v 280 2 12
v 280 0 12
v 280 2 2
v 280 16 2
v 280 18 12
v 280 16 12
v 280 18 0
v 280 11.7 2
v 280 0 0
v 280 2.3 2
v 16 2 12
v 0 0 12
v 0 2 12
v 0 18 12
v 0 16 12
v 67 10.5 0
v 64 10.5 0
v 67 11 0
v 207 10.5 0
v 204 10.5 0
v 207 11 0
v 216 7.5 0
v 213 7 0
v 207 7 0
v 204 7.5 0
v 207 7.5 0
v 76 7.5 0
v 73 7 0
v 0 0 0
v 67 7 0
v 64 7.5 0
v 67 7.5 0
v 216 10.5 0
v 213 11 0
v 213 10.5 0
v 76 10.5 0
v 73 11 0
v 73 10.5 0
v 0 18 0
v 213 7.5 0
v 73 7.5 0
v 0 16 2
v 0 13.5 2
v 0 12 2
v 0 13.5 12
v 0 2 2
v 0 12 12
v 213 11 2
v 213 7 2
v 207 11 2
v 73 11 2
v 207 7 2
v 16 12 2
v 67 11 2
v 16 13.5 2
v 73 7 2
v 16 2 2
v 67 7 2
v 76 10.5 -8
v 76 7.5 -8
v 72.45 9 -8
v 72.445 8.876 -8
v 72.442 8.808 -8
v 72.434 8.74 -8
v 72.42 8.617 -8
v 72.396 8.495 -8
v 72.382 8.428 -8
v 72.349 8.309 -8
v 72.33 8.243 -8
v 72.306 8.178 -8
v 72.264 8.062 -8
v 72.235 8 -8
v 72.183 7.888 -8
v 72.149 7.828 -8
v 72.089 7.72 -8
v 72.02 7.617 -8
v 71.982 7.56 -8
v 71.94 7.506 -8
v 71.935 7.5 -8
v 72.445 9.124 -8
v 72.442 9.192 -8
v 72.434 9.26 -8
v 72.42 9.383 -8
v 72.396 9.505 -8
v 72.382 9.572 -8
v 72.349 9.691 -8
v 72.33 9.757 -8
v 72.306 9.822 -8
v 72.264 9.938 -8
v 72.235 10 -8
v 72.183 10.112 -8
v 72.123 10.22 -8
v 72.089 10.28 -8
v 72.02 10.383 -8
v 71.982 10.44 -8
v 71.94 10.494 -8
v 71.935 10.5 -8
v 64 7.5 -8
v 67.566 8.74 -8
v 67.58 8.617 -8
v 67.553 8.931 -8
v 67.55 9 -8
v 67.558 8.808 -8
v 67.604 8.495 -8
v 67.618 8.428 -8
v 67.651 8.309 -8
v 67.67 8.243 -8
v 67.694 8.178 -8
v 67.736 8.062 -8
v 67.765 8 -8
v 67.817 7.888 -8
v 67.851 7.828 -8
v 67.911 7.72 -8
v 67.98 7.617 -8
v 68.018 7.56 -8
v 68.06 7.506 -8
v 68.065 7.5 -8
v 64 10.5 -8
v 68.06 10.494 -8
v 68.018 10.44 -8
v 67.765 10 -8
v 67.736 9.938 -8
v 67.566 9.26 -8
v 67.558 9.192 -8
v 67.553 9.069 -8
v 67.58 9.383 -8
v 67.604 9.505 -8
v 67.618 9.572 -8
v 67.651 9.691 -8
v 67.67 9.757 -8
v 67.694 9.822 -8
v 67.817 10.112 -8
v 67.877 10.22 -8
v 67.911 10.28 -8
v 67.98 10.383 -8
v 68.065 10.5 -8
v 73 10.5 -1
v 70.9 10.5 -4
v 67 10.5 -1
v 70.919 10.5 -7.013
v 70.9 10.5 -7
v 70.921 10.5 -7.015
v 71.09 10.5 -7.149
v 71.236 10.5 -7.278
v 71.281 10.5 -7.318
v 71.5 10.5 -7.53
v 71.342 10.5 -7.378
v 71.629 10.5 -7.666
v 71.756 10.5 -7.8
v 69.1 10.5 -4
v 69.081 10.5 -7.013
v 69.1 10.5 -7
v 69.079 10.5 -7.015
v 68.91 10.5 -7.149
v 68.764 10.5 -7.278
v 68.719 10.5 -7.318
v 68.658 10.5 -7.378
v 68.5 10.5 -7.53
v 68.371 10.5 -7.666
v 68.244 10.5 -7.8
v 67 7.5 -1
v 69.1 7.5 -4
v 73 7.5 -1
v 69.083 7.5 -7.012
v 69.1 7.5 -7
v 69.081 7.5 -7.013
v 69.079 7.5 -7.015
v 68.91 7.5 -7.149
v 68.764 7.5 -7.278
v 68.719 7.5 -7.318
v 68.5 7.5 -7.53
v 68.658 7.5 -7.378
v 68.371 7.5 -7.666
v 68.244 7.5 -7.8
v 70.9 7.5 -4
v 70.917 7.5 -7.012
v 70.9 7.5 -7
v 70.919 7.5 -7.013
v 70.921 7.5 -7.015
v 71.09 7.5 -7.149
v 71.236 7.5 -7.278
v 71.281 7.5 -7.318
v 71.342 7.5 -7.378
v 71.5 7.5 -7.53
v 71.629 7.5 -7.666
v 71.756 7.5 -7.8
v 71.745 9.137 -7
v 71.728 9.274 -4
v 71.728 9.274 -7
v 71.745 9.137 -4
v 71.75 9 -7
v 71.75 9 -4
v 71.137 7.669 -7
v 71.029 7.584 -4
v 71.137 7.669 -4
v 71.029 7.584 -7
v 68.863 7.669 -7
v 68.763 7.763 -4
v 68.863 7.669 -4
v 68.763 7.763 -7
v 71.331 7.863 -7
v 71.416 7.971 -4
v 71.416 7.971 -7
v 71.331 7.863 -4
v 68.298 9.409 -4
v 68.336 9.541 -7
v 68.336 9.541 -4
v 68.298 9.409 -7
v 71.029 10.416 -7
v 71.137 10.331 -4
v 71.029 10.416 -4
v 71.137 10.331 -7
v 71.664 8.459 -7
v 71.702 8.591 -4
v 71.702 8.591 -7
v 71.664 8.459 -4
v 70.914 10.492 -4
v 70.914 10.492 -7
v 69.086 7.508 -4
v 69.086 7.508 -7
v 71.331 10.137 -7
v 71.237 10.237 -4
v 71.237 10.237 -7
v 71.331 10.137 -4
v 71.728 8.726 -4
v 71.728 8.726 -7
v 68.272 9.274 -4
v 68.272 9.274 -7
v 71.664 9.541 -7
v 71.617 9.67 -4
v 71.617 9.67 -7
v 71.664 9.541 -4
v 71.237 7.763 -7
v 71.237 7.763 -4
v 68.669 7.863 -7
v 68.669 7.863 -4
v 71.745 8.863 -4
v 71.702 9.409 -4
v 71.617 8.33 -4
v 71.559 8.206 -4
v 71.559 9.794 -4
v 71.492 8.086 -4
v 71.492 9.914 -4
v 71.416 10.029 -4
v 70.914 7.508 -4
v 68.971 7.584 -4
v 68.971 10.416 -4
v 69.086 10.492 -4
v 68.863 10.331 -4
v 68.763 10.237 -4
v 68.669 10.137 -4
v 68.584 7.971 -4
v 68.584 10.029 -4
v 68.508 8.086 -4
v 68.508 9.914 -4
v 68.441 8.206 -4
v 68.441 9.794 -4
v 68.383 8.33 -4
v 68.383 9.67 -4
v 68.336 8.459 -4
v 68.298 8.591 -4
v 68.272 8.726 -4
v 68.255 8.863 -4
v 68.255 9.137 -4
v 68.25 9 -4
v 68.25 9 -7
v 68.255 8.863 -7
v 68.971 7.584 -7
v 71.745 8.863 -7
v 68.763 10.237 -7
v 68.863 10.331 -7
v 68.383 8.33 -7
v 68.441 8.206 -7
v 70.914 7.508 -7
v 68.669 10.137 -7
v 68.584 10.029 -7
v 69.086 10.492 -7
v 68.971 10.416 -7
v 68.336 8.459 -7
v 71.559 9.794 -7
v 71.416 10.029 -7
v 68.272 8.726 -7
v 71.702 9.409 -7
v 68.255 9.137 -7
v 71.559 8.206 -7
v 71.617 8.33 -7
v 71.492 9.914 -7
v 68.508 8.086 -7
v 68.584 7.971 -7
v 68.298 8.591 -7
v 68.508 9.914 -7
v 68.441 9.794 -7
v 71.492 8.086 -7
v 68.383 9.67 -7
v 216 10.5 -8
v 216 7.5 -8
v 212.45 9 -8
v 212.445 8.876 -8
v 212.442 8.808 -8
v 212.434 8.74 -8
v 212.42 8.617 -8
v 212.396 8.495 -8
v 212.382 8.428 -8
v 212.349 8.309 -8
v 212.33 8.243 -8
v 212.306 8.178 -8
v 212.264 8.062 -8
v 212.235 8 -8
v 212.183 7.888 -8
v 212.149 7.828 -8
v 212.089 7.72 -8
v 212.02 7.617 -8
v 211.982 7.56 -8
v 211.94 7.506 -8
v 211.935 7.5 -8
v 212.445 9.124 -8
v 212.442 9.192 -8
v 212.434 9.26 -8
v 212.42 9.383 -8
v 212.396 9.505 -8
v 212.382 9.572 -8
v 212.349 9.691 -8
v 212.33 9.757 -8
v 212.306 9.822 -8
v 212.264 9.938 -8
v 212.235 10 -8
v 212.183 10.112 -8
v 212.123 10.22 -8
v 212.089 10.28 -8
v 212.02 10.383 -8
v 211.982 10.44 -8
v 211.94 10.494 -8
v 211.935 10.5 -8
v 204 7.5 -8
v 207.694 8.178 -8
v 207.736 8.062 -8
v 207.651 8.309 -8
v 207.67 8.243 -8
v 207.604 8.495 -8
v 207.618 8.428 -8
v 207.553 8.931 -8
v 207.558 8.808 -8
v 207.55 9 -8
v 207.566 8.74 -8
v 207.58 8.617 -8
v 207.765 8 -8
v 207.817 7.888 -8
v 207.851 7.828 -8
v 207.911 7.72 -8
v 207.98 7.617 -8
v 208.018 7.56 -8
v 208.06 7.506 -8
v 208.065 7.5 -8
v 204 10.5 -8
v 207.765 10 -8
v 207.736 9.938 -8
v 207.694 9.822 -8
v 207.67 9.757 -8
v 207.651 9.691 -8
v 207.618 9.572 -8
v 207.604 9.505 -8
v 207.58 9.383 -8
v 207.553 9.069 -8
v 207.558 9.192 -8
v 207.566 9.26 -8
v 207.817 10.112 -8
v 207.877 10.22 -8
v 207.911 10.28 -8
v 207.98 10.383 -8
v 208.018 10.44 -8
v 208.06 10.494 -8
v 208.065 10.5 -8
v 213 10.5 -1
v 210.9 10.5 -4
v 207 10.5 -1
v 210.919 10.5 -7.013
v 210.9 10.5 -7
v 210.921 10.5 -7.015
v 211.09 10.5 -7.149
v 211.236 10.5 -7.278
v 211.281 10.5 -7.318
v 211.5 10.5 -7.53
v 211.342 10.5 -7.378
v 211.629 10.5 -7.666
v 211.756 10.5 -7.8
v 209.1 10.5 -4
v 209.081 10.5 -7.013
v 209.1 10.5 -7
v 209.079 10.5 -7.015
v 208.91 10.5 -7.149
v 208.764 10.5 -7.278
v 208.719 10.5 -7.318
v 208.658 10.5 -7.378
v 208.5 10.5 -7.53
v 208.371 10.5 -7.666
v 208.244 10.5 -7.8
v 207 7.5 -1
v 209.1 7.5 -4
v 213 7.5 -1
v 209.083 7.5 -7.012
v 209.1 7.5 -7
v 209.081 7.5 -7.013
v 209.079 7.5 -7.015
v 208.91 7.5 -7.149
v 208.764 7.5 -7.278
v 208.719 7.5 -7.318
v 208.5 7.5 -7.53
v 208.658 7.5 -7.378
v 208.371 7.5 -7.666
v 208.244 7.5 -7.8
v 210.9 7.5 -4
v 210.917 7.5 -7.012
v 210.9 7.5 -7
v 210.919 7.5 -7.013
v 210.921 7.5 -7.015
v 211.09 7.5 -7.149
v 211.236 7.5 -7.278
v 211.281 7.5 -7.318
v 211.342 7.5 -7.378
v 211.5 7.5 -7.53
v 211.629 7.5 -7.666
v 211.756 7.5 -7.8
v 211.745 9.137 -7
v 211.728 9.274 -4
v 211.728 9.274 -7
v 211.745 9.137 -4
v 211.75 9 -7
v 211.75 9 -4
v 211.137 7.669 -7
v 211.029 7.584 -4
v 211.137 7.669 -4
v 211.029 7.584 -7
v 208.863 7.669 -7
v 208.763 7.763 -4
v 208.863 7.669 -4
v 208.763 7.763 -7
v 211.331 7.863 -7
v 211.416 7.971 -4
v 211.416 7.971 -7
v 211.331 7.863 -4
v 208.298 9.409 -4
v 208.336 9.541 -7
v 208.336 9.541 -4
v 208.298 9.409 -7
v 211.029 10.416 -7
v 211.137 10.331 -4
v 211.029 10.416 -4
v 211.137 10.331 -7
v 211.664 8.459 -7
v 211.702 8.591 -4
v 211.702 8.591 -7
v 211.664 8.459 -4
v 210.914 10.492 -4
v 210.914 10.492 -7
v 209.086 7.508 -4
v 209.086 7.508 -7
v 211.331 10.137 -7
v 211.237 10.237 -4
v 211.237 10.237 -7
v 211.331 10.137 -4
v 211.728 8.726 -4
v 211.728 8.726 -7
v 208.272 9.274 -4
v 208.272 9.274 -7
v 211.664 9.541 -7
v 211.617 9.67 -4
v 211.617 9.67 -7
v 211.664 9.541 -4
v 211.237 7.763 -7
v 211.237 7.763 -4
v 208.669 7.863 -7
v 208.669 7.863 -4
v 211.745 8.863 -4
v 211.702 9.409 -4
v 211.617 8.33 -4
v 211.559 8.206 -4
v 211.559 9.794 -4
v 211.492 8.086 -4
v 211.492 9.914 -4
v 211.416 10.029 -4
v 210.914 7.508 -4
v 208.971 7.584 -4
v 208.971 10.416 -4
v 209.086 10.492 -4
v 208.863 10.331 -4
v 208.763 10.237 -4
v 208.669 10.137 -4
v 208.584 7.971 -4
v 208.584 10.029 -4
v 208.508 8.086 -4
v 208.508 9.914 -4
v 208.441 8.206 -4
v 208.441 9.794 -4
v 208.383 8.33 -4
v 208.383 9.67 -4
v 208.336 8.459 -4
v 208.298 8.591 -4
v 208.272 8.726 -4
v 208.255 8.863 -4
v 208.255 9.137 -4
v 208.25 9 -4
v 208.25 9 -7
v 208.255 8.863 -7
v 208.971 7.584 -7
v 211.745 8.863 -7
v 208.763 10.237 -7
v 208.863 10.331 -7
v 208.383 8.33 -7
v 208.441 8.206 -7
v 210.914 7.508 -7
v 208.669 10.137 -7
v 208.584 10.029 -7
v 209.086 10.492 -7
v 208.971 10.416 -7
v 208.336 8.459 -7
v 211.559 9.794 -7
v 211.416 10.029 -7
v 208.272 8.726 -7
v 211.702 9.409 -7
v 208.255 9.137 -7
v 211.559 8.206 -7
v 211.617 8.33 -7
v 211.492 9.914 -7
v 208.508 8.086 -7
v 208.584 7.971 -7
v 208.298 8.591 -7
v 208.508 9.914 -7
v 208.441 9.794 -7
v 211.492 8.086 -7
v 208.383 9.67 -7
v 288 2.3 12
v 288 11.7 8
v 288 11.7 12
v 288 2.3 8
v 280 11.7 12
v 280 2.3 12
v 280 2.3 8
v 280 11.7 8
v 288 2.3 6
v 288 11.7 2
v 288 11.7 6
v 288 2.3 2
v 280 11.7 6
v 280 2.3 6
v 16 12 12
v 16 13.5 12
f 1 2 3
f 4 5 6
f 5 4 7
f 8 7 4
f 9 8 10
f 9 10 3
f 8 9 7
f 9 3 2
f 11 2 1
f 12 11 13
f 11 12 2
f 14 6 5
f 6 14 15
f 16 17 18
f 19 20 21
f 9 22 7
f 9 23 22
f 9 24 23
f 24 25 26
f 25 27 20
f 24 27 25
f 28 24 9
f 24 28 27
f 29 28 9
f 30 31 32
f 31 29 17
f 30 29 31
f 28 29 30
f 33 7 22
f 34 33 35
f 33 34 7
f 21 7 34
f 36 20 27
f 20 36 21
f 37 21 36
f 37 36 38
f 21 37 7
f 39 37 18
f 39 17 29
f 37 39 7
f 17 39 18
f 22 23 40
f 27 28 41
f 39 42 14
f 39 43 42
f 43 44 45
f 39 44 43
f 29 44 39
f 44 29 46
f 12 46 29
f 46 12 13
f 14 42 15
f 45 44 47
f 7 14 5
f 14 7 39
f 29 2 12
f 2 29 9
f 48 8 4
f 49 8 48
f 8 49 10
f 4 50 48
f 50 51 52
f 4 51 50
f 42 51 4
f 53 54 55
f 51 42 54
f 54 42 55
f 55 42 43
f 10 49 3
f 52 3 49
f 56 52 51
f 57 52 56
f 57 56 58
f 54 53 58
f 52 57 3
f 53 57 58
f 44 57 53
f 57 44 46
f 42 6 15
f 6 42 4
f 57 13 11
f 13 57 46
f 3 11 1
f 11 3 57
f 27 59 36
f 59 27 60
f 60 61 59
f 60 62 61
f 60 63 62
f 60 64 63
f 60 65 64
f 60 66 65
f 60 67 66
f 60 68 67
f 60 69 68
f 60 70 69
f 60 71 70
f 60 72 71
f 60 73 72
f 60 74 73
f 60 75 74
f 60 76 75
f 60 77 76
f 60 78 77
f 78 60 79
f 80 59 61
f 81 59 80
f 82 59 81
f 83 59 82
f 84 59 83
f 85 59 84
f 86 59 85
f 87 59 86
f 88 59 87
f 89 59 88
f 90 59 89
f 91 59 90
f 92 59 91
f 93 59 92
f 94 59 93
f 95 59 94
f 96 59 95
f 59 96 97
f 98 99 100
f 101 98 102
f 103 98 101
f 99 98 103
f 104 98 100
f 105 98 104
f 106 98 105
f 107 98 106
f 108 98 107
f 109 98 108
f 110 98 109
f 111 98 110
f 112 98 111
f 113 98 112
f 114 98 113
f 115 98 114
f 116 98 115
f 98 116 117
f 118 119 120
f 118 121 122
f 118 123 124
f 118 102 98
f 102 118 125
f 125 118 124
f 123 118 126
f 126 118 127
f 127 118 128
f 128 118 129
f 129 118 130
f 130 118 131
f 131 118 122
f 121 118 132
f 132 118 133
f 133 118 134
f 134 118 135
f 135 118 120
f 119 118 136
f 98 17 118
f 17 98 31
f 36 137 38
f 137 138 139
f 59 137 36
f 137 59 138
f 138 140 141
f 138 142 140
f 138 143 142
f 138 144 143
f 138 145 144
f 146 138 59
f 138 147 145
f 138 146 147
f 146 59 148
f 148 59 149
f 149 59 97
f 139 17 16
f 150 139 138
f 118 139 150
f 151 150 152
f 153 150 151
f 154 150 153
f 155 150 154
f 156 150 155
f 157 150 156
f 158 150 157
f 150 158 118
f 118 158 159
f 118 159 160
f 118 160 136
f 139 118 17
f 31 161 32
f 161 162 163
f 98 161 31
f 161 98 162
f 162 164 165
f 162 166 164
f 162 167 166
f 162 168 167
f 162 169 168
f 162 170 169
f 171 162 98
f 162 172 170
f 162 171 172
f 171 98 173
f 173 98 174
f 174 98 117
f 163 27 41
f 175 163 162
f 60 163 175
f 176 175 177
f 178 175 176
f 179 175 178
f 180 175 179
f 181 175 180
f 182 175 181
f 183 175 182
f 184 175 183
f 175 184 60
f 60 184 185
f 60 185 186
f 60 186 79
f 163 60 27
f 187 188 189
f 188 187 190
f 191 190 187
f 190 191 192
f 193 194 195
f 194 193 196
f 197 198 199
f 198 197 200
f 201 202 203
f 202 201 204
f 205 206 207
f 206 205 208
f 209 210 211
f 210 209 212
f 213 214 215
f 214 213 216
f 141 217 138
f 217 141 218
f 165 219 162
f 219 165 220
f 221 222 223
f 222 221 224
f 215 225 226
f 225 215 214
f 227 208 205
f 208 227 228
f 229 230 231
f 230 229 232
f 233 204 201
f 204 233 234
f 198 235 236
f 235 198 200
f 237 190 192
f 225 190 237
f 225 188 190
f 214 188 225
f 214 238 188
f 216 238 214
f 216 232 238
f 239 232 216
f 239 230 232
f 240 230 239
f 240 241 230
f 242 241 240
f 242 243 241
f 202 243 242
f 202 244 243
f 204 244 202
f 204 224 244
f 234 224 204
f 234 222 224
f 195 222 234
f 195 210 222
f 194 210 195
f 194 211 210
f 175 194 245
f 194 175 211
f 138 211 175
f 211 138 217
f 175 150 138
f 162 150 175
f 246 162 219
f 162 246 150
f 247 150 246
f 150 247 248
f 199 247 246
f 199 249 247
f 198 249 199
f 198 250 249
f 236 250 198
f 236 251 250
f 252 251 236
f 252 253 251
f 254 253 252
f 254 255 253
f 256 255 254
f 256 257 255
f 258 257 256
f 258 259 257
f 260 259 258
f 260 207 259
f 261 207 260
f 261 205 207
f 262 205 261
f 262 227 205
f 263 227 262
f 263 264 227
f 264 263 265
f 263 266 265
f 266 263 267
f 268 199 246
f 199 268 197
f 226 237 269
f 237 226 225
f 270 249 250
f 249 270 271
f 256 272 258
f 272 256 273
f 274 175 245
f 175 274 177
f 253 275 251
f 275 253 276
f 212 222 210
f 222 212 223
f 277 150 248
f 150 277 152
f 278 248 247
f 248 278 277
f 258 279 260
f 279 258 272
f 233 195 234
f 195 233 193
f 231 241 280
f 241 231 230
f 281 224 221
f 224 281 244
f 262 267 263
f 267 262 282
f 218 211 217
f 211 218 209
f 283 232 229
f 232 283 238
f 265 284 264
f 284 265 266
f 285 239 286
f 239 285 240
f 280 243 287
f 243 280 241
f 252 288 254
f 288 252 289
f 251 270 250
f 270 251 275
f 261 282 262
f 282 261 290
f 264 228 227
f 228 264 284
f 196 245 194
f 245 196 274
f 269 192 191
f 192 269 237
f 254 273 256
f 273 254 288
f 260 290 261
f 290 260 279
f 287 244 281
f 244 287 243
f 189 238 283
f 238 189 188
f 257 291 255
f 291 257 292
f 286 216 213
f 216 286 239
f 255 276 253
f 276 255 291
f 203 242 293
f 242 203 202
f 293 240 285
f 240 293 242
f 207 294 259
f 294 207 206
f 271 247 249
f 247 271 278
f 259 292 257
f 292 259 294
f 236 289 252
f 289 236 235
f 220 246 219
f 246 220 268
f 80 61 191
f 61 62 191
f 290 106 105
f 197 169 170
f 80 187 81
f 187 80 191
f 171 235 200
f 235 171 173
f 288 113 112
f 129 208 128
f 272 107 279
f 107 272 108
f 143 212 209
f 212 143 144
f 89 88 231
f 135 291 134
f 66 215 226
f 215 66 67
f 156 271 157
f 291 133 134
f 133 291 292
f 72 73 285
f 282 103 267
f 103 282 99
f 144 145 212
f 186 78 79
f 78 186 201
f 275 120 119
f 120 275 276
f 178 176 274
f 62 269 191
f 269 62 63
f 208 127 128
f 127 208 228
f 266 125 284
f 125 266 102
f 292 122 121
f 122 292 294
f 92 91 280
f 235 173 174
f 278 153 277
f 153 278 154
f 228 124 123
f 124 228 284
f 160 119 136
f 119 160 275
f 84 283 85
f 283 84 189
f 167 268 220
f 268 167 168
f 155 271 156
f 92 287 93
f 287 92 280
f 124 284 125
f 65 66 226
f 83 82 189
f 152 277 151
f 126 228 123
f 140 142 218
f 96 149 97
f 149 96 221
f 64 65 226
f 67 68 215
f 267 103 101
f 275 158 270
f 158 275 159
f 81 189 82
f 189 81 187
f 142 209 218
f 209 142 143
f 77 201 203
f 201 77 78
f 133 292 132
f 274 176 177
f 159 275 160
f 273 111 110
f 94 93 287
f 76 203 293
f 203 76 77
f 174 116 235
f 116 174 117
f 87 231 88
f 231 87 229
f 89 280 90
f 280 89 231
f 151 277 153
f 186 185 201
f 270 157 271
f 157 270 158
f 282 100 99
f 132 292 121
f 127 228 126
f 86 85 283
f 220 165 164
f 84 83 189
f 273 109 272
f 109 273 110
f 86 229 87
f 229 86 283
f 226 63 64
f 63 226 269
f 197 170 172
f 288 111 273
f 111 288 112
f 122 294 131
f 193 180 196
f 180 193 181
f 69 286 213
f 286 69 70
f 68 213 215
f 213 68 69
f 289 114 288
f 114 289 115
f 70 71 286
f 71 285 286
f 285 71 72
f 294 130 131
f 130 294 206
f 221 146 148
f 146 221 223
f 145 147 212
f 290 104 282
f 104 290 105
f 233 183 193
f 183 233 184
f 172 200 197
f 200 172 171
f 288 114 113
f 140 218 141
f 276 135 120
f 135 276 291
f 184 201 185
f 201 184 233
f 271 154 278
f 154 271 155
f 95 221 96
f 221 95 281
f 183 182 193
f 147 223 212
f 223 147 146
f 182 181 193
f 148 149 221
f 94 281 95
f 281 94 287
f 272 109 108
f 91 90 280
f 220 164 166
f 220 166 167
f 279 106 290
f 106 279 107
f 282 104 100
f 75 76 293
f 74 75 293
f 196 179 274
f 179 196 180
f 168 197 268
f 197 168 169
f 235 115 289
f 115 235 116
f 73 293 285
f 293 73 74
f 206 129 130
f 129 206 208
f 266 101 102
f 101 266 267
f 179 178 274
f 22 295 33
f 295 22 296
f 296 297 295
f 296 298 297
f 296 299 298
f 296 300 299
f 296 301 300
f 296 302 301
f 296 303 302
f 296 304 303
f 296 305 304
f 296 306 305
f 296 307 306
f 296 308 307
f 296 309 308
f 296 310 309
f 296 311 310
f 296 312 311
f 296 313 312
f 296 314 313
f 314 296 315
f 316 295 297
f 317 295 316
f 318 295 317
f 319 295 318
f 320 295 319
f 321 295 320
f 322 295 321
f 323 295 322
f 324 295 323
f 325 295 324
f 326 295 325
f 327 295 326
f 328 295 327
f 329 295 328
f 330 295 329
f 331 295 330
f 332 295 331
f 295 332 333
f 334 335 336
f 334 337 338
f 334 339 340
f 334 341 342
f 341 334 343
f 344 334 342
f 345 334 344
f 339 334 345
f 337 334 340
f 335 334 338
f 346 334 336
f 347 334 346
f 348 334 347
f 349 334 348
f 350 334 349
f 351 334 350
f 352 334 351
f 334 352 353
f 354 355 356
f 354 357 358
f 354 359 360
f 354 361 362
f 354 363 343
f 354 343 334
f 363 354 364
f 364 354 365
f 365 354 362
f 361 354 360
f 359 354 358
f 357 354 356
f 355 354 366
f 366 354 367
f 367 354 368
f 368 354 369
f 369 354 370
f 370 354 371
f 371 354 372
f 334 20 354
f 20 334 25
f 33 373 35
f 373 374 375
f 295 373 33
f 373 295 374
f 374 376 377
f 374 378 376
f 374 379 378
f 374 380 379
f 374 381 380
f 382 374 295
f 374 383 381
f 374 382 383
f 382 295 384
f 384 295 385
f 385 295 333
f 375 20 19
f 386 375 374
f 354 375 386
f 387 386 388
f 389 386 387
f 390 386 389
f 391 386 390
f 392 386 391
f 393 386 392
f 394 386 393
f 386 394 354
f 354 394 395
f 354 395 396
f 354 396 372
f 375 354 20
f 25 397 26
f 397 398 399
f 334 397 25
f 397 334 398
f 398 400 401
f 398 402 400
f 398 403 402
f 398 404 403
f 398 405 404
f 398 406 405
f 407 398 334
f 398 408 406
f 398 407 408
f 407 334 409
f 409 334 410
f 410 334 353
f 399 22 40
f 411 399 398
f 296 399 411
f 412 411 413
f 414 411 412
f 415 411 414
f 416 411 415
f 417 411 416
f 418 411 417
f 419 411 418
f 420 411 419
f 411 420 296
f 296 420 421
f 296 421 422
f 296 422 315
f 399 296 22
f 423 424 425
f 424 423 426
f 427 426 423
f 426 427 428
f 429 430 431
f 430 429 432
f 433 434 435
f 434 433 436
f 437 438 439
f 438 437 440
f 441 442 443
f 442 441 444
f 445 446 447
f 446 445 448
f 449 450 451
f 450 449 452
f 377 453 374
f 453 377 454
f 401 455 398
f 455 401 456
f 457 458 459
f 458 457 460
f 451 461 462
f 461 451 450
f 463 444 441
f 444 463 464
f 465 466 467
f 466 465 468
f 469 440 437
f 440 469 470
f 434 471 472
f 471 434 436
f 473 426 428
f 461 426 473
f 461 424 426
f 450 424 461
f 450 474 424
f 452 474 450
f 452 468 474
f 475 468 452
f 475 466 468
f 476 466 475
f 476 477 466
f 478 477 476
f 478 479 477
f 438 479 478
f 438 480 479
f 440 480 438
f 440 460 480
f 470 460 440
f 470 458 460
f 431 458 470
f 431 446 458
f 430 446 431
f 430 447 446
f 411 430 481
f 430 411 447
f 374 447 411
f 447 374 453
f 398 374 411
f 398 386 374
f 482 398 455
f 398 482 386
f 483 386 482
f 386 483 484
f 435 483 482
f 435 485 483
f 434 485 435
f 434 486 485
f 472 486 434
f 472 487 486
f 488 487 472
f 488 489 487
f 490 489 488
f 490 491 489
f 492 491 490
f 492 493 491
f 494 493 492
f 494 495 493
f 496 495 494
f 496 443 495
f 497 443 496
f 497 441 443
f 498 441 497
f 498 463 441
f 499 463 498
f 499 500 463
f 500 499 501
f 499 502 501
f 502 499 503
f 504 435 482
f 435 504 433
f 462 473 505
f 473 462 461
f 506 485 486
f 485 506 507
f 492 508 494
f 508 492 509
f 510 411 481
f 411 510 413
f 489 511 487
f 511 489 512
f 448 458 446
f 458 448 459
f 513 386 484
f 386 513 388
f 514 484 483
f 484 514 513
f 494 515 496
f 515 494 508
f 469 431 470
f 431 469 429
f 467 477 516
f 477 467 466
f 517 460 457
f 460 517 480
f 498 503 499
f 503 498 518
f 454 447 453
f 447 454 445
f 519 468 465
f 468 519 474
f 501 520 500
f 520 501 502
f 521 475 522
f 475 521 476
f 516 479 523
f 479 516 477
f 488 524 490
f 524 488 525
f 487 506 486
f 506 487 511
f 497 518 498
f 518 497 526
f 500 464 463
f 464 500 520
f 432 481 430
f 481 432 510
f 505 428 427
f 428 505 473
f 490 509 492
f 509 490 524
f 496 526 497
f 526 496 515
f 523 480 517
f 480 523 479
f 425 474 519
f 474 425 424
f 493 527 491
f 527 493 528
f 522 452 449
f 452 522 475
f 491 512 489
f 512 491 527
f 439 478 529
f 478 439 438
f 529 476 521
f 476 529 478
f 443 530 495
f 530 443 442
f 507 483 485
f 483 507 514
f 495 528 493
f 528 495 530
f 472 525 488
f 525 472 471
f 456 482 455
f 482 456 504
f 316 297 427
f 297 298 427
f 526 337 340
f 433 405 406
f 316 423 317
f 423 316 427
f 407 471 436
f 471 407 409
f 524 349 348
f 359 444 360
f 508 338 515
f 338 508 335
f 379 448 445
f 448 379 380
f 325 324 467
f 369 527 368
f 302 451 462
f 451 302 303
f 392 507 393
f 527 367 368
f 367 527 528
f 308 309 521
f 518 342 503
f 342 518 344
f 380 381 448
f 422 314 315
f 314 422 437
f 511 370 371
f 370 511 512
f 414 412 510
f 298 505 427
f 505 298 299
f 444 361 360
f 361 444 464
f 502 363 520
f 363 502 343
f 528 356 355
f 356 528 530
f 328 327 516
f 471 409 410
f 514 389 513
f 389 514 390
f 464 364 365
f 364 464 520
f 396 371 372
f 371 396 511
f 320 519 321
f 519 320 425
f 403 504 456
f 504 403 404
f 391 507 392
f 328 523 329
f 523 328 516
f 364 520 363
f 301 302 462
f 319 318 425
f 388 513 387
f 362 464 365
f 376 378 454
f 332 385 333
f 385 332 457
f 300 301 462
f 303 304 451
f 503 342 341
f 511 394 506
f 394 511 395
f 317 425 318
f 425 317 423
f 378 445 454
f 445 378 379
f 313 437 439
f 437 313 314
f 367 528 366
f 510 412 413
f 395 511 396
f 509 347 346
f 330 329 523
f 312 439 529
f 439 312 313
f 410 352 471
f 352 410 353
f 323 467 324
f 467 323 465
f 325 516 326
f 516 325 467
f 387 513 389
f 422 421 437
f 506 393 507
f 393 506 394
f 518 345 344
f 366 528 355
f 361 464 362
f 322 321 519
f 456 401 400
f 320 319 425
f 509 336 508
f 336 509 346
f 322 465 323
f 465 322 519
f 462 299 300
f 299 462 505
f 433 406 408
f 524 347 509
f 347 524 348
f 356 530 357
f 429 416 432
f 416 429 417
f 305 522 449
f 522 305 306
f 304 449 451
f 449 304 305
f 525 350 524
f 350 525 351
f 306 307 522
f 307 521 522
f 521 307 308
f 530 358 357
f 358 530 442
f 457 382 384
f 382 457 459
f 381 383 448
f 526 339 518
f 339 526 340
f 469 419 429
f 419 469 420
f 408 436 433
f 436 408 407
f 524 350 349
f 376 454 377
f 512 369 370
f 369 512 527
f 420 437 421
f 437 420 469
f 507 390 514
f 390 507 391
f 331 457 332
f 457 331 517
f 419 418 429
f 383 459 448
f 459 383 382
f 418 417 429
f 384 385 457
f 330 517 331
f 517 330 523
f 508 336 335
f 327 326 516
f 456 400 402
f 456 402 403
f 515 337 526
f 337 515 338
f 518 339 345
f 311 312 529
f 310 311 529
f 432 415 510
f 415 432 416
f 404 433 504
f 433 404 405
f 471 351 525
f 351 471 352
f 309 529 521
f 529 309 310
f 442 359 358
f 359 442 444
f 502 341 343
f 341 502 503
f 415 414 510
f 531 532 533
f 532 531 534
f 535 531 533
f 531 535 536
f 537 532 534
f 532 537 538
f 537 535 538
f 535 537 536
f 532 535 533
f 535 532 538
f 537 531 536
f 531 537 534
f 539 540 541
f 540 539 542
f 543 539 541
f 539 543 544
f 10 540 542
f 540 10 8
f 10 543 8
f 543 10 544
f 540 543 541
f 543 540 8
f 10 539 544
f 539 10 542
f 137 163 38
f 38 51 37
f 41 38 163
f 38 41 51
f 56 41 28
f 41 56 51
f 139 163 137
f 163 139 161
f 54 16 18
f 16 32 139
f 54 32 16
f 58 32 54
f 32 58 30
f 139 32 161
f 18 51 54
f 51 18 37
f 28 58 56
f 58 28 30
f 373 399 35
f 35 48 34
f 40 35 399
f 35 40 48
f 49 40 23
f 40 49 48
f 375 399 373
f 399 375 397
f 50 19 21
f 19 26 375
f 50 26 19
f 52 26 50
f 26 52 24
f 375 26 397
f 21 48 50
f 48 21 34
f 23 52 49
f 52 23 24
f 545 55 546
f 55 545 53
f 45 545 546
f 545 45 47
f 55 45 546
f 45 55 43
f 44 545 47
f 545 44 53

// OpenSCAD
/*
    Project: Parametric LED Channel for SK6812 RGBW Strip
    Author: Claude Code
    Date: 2025-01-05

    Description:
    Modular LED channel segment optimized for Qidi Plus 4 printer (280mm segments).
    Features interlocking connectors, integrated mounting clips, wire routing channels,
    and tunable diffuser walls for perfect light distribution.

    Hardware:
    - SK6812 RGBW LED Strip (10mm wide, 60 LEDs/meter)
    - M3 mounting screws (optional)
    - Designed for bed frame mounting

    Assembly:
    - 29 segments needed for 8 meters total
    - Male/female connectors snap together
    - Power injection points every 2.5-3 meters

    Print Settings:
    - Material: Transparent PETG
    - Layer height: 0.2mm
    - Infill: 20-40% (balance between diffusion and strength)
    - Wall thickness: Tune 'diffuser_wall_thickness' for desired light spread
*/

// ============================================================================
// GLOBAL PARAMETERS - ADJUST THESE FOR YOUR NEEDS
// ============================================================================

$fn = 80; // Smoothness (higher = smoother curves, slower render)

// --- Segment Dimensions ---
segment_length = 280;        // Maximum length for Qidi Plus 4 (305mm bed)
channel_width = 14;          // Internal width (10mm LED strip + 2mm clearance each side)
channel_depth = 10;          // Internal depth (8mm for LEDs + 2mm clearance)
diffuser_wall_thickness = 1.8; // TUNE THIS: 1.5mm = bright, 2.0mm = more diffused
side_wall_thickness = 2.0;   // Side walls (structural strength)
base_thickness = 2.0;        // Bottom base

// --- LED Strip Specifications ---
led_strip_width = 10;        // SK6812 RGBW strip width
led_strip_height = 3;        // Strip thickness including adhesive backing

// --- Mounting Clips ---
enable_mounting_clips = true;  // Set to false to disable clips
clip_spacing = 140;            // Distance between mounting clips (2 per segment)
clip_height = 8;               // Height of mounting tab
clip_thickness = 3;            // Thickness of mounting tab
clip_hole_diameter = 3.5;      // M3 screw clearance hole
clip_width = 12;               // Width of each mounting clip

// --- Interlocking Connectors ---
connector_depth = 8;           // How deep the male/female connectors go
connector_tolerance = 0.3;     // Clearance for snap-fit (0.2-0.4mm typical)
connector_width = 10;          // Width of connector tabs

// --- Wire Routing Channels ---
wire_channel_width = 6;        // Width of wire routing slot
wire_channel_depth = 4;        // Depth of wire channel
wire_channel_positions = [70, 210]; // X positions for wire exit points (power injection)

// --- Calculated Dimensions ---
total_width = channel_width + (side_wall_thickness * 2);
total_height = channel_depth + base_thickness;

// ============================================================================
// MAIN ASSEMBLY - Render this!
// ============================================================================

module led_channel_segment() {
    difference() {
        union() {
            // Main channel body
            channel_body();

            // Mounting clips
            if (enable_mounting_clips) {
                mounting_clips();
            }

            // Male connector (right end)
            translate([segment_length, 0, 0])
                male_connector();
        }

        // Female connector cutout (left end)
        translate([0, 0, 0])
            female_connector_cutout();

        // Wire routing channels
        wire_routing_channels();
    }

    // Female connector guide rails (left end, inside channel)
    translate([0, 0, 0])
        female_connector_guides();
}

// ============================================================================
// MODULES
// ============================================================================

module channel_body() {
    difference() {
        // Outer shell
        cube([segment_length, total_width, total_height]);

        // Inner cavity for LED strip
        translate([0, side_wall_thickness, base_thickness])
            cube([segment_length, channel_width, channel_depth + 1]);

        // Top opening (diffuser layer only)
        translate([0, side_wall_thickness, base_thickness + led_strip_height])
            cube([segment_length, channel_width, channel_depth]);
    }
}

module mounting_clips() {
    // Calculate clip positions (centered, evenly spaced)
    num_clips = 2;
    first_clip_pos = (segment_length - ((num_clips - 1) * clip_spacing)) / 2;

    for (i = [0 : num_clips - 1]) {
        clip_x = first_clip_pos + (i * clip_spacing);

        translate([clip_x - clip_width/2, total_width/2 - clip_thickness/2, -clip_height]) {
            difference() {
                // Mounting tab
                cube([clip_width, clip_thickness, clip_height]);

                // Screw hole (countersunk from bottom)
                translate([clip_width/2, clip_thickness/2, -1])
                    cylinder(h = clip_height/2 + 1, d = clip_hole_diameter);

                // Countersink (optional, for flush mounting)
                translate([clip_width/2, clip_thickness/2, -1])
                    cylinder(h = 2, d1 = clip_hole_diameter * 1.8, d2 = clip_hole_diameter);
            }
        }
    }
}

module male_connector() {
    // Male connector extends from the right end
    connector_height = total_height - base_thickness;

    translate([0, side_wall_thickness + connector_tolerance, base_thickness]) {
        // Top tab
        translate([0, 0, connector_height/2 + 1])
            cube([connector_depth, connector_width - (connector_tolerance * 2), connector_height/2 - 1]);

        // Bottom tab
        translate([0, 0, 0])
            cube([connector_depth, connector_width - (connector_tolerance * 2), connector_height/2 - 1]);
    }
}

module female_connector_cutout() {
    // Female connector cutout receives male connector from previous segment
    connector_height = total_height - base_thickness;

    translate([-connector_depth, side_wall_thickness, base_thickness]) {
        // Top slot
        translate([0, 0, connector_height/2 + 1])
            cube([connector_depth + 0.5, connector_width, connector_height/2 + 1]);

        // Bottom slot
        translate([0, 0, 0])
            cube([connector_depth + 0.5, connector_width, connector_height/2 - 1]);
    }
}

module female_connector_guides() {
    // Guide rails inside channel to support female connector
    connector_height = total_height - base_thickness;
    guide_thickness = 1.5;

    translate([0, side_wall_thickness, base_thickness]) {
        // Left guide rail
        translate([0, -guide_thickness, 0])
            cube([connector_depth * 2, guide_thickness, connector_height]);

        // Right guide rail
        translate([0, connector_width, 0])
            cube([connector_depth * 2, guide_thickness, connector_height]);
    }
}

module wire_routing_channels() {
    // Cutouts in the base for power injection wires to exit
    for (x_pos = wire_channel_positions) {
        translate([x_pos - wire_channel_width/2, total_width/2 - wire_channel_depth/2, -1])
            cube([wire_channel_width, wire_channel_depth, base_thickness + 2]);
    }
}

// ============================================================================
// TEST PIECES - Uncomment to print individual components for testing
// ============================================================================

// Render full segment (default)
led_channel_segment();

// Test connector fit (print both, test snap-fit)
//translate([0, 0, 0]) male_connector();
//translate([15, 0, 0]) female_connector_cutout();

// Test diffusion (print 50mm segment with different wall thicknesses)
/*
for (i = [0:3]) {
    translate([0, i * 25, 0]) {
        difference() {
            cube([50, 20, total_height]);
            translate([0, side_wall_thickness, base_thickness])
                cube([50, channel_width, channel_depth + 1]);
            translate([0, side_wall_thickness, base_thickness + led_strip_height])
                cube([50, channel_width, channel_depth]);
        }
        // Label the wall thickness
        translate([5, 22, 0])
            linear_extrude(0.5)
                text(str((1.5 + i*0.2), "mm"), size=3);
    }
}
*/

// ============================================================================
// NOTES & ASSEMBLY INSTRUCTIONS
// ============================================================================

/*
PRINTING INSTRUCTIONS:
======================
1. Slice with:
   - Layer height: 0.2mm
   - Infill: 20-40% (higher = better diffusion, dimmer)
   - Walls: 3-4 perimeters
   - Top/bottom layers: 4-5
   - No supports needed!

2. Orientation:
   - Print with diffuser facing UP (better surface finish for light)
   - Mounting clips facing down (print on bed)

3. First Print:
   - Print 2 test segments (560mm total)
   - Test LED strip fit
   - Test connector snap-fit
   - Evaluate light diffusion
   - Adjust parameters if needed

TUNING DIFFUSION:
==================
- Too bright/see individual LEDs? Increase 'diffuser_wall_thickness' to 2.0-2.2mm
- Too dim? Decrease to 1.5-1.6mm
- Want hotspot-free? Increase infill to 40-60%
- Infill pattern: Gyroid or Grid works best for even light

ASSEMBLY:
=========
1. Insert LED strip into channel (adhesive side down on base)
2. Route power wires through wire_channel cutouts
3. Snap segments together (male into female connector)
4. Mount to bed frame using M3 screws through clip holes
5. Connect power injection wires at designated points

WIRE INJECTION POINTS:
======================
- First segment: Main power input
- Every 2.5-3 meters: Additional power injection
- Wire channels at 70mm and 210mm allow routing without gaps

CONNECTOR STRENGTH:
===================
- Snap-fit design holds segments aligned
- No glue needed for temporary installations
- Optional: Add tiny dab of super glue if permanent
- Tolerance of 0.3mm allows tight fit without binding

BOM FOR 8 METERS (29 SEGMENTS):
================================
- Filament: ~800g-1kg Transparent PETG
- Print time: ~70-80 hours
- Screws: 58x M3x8mm (2 per segment)
- LED strip: 8 meters SK6812 RGBW (480 LEDs)
- Power supply: 12V 5A + 3x LM2596 buck converters
*/
